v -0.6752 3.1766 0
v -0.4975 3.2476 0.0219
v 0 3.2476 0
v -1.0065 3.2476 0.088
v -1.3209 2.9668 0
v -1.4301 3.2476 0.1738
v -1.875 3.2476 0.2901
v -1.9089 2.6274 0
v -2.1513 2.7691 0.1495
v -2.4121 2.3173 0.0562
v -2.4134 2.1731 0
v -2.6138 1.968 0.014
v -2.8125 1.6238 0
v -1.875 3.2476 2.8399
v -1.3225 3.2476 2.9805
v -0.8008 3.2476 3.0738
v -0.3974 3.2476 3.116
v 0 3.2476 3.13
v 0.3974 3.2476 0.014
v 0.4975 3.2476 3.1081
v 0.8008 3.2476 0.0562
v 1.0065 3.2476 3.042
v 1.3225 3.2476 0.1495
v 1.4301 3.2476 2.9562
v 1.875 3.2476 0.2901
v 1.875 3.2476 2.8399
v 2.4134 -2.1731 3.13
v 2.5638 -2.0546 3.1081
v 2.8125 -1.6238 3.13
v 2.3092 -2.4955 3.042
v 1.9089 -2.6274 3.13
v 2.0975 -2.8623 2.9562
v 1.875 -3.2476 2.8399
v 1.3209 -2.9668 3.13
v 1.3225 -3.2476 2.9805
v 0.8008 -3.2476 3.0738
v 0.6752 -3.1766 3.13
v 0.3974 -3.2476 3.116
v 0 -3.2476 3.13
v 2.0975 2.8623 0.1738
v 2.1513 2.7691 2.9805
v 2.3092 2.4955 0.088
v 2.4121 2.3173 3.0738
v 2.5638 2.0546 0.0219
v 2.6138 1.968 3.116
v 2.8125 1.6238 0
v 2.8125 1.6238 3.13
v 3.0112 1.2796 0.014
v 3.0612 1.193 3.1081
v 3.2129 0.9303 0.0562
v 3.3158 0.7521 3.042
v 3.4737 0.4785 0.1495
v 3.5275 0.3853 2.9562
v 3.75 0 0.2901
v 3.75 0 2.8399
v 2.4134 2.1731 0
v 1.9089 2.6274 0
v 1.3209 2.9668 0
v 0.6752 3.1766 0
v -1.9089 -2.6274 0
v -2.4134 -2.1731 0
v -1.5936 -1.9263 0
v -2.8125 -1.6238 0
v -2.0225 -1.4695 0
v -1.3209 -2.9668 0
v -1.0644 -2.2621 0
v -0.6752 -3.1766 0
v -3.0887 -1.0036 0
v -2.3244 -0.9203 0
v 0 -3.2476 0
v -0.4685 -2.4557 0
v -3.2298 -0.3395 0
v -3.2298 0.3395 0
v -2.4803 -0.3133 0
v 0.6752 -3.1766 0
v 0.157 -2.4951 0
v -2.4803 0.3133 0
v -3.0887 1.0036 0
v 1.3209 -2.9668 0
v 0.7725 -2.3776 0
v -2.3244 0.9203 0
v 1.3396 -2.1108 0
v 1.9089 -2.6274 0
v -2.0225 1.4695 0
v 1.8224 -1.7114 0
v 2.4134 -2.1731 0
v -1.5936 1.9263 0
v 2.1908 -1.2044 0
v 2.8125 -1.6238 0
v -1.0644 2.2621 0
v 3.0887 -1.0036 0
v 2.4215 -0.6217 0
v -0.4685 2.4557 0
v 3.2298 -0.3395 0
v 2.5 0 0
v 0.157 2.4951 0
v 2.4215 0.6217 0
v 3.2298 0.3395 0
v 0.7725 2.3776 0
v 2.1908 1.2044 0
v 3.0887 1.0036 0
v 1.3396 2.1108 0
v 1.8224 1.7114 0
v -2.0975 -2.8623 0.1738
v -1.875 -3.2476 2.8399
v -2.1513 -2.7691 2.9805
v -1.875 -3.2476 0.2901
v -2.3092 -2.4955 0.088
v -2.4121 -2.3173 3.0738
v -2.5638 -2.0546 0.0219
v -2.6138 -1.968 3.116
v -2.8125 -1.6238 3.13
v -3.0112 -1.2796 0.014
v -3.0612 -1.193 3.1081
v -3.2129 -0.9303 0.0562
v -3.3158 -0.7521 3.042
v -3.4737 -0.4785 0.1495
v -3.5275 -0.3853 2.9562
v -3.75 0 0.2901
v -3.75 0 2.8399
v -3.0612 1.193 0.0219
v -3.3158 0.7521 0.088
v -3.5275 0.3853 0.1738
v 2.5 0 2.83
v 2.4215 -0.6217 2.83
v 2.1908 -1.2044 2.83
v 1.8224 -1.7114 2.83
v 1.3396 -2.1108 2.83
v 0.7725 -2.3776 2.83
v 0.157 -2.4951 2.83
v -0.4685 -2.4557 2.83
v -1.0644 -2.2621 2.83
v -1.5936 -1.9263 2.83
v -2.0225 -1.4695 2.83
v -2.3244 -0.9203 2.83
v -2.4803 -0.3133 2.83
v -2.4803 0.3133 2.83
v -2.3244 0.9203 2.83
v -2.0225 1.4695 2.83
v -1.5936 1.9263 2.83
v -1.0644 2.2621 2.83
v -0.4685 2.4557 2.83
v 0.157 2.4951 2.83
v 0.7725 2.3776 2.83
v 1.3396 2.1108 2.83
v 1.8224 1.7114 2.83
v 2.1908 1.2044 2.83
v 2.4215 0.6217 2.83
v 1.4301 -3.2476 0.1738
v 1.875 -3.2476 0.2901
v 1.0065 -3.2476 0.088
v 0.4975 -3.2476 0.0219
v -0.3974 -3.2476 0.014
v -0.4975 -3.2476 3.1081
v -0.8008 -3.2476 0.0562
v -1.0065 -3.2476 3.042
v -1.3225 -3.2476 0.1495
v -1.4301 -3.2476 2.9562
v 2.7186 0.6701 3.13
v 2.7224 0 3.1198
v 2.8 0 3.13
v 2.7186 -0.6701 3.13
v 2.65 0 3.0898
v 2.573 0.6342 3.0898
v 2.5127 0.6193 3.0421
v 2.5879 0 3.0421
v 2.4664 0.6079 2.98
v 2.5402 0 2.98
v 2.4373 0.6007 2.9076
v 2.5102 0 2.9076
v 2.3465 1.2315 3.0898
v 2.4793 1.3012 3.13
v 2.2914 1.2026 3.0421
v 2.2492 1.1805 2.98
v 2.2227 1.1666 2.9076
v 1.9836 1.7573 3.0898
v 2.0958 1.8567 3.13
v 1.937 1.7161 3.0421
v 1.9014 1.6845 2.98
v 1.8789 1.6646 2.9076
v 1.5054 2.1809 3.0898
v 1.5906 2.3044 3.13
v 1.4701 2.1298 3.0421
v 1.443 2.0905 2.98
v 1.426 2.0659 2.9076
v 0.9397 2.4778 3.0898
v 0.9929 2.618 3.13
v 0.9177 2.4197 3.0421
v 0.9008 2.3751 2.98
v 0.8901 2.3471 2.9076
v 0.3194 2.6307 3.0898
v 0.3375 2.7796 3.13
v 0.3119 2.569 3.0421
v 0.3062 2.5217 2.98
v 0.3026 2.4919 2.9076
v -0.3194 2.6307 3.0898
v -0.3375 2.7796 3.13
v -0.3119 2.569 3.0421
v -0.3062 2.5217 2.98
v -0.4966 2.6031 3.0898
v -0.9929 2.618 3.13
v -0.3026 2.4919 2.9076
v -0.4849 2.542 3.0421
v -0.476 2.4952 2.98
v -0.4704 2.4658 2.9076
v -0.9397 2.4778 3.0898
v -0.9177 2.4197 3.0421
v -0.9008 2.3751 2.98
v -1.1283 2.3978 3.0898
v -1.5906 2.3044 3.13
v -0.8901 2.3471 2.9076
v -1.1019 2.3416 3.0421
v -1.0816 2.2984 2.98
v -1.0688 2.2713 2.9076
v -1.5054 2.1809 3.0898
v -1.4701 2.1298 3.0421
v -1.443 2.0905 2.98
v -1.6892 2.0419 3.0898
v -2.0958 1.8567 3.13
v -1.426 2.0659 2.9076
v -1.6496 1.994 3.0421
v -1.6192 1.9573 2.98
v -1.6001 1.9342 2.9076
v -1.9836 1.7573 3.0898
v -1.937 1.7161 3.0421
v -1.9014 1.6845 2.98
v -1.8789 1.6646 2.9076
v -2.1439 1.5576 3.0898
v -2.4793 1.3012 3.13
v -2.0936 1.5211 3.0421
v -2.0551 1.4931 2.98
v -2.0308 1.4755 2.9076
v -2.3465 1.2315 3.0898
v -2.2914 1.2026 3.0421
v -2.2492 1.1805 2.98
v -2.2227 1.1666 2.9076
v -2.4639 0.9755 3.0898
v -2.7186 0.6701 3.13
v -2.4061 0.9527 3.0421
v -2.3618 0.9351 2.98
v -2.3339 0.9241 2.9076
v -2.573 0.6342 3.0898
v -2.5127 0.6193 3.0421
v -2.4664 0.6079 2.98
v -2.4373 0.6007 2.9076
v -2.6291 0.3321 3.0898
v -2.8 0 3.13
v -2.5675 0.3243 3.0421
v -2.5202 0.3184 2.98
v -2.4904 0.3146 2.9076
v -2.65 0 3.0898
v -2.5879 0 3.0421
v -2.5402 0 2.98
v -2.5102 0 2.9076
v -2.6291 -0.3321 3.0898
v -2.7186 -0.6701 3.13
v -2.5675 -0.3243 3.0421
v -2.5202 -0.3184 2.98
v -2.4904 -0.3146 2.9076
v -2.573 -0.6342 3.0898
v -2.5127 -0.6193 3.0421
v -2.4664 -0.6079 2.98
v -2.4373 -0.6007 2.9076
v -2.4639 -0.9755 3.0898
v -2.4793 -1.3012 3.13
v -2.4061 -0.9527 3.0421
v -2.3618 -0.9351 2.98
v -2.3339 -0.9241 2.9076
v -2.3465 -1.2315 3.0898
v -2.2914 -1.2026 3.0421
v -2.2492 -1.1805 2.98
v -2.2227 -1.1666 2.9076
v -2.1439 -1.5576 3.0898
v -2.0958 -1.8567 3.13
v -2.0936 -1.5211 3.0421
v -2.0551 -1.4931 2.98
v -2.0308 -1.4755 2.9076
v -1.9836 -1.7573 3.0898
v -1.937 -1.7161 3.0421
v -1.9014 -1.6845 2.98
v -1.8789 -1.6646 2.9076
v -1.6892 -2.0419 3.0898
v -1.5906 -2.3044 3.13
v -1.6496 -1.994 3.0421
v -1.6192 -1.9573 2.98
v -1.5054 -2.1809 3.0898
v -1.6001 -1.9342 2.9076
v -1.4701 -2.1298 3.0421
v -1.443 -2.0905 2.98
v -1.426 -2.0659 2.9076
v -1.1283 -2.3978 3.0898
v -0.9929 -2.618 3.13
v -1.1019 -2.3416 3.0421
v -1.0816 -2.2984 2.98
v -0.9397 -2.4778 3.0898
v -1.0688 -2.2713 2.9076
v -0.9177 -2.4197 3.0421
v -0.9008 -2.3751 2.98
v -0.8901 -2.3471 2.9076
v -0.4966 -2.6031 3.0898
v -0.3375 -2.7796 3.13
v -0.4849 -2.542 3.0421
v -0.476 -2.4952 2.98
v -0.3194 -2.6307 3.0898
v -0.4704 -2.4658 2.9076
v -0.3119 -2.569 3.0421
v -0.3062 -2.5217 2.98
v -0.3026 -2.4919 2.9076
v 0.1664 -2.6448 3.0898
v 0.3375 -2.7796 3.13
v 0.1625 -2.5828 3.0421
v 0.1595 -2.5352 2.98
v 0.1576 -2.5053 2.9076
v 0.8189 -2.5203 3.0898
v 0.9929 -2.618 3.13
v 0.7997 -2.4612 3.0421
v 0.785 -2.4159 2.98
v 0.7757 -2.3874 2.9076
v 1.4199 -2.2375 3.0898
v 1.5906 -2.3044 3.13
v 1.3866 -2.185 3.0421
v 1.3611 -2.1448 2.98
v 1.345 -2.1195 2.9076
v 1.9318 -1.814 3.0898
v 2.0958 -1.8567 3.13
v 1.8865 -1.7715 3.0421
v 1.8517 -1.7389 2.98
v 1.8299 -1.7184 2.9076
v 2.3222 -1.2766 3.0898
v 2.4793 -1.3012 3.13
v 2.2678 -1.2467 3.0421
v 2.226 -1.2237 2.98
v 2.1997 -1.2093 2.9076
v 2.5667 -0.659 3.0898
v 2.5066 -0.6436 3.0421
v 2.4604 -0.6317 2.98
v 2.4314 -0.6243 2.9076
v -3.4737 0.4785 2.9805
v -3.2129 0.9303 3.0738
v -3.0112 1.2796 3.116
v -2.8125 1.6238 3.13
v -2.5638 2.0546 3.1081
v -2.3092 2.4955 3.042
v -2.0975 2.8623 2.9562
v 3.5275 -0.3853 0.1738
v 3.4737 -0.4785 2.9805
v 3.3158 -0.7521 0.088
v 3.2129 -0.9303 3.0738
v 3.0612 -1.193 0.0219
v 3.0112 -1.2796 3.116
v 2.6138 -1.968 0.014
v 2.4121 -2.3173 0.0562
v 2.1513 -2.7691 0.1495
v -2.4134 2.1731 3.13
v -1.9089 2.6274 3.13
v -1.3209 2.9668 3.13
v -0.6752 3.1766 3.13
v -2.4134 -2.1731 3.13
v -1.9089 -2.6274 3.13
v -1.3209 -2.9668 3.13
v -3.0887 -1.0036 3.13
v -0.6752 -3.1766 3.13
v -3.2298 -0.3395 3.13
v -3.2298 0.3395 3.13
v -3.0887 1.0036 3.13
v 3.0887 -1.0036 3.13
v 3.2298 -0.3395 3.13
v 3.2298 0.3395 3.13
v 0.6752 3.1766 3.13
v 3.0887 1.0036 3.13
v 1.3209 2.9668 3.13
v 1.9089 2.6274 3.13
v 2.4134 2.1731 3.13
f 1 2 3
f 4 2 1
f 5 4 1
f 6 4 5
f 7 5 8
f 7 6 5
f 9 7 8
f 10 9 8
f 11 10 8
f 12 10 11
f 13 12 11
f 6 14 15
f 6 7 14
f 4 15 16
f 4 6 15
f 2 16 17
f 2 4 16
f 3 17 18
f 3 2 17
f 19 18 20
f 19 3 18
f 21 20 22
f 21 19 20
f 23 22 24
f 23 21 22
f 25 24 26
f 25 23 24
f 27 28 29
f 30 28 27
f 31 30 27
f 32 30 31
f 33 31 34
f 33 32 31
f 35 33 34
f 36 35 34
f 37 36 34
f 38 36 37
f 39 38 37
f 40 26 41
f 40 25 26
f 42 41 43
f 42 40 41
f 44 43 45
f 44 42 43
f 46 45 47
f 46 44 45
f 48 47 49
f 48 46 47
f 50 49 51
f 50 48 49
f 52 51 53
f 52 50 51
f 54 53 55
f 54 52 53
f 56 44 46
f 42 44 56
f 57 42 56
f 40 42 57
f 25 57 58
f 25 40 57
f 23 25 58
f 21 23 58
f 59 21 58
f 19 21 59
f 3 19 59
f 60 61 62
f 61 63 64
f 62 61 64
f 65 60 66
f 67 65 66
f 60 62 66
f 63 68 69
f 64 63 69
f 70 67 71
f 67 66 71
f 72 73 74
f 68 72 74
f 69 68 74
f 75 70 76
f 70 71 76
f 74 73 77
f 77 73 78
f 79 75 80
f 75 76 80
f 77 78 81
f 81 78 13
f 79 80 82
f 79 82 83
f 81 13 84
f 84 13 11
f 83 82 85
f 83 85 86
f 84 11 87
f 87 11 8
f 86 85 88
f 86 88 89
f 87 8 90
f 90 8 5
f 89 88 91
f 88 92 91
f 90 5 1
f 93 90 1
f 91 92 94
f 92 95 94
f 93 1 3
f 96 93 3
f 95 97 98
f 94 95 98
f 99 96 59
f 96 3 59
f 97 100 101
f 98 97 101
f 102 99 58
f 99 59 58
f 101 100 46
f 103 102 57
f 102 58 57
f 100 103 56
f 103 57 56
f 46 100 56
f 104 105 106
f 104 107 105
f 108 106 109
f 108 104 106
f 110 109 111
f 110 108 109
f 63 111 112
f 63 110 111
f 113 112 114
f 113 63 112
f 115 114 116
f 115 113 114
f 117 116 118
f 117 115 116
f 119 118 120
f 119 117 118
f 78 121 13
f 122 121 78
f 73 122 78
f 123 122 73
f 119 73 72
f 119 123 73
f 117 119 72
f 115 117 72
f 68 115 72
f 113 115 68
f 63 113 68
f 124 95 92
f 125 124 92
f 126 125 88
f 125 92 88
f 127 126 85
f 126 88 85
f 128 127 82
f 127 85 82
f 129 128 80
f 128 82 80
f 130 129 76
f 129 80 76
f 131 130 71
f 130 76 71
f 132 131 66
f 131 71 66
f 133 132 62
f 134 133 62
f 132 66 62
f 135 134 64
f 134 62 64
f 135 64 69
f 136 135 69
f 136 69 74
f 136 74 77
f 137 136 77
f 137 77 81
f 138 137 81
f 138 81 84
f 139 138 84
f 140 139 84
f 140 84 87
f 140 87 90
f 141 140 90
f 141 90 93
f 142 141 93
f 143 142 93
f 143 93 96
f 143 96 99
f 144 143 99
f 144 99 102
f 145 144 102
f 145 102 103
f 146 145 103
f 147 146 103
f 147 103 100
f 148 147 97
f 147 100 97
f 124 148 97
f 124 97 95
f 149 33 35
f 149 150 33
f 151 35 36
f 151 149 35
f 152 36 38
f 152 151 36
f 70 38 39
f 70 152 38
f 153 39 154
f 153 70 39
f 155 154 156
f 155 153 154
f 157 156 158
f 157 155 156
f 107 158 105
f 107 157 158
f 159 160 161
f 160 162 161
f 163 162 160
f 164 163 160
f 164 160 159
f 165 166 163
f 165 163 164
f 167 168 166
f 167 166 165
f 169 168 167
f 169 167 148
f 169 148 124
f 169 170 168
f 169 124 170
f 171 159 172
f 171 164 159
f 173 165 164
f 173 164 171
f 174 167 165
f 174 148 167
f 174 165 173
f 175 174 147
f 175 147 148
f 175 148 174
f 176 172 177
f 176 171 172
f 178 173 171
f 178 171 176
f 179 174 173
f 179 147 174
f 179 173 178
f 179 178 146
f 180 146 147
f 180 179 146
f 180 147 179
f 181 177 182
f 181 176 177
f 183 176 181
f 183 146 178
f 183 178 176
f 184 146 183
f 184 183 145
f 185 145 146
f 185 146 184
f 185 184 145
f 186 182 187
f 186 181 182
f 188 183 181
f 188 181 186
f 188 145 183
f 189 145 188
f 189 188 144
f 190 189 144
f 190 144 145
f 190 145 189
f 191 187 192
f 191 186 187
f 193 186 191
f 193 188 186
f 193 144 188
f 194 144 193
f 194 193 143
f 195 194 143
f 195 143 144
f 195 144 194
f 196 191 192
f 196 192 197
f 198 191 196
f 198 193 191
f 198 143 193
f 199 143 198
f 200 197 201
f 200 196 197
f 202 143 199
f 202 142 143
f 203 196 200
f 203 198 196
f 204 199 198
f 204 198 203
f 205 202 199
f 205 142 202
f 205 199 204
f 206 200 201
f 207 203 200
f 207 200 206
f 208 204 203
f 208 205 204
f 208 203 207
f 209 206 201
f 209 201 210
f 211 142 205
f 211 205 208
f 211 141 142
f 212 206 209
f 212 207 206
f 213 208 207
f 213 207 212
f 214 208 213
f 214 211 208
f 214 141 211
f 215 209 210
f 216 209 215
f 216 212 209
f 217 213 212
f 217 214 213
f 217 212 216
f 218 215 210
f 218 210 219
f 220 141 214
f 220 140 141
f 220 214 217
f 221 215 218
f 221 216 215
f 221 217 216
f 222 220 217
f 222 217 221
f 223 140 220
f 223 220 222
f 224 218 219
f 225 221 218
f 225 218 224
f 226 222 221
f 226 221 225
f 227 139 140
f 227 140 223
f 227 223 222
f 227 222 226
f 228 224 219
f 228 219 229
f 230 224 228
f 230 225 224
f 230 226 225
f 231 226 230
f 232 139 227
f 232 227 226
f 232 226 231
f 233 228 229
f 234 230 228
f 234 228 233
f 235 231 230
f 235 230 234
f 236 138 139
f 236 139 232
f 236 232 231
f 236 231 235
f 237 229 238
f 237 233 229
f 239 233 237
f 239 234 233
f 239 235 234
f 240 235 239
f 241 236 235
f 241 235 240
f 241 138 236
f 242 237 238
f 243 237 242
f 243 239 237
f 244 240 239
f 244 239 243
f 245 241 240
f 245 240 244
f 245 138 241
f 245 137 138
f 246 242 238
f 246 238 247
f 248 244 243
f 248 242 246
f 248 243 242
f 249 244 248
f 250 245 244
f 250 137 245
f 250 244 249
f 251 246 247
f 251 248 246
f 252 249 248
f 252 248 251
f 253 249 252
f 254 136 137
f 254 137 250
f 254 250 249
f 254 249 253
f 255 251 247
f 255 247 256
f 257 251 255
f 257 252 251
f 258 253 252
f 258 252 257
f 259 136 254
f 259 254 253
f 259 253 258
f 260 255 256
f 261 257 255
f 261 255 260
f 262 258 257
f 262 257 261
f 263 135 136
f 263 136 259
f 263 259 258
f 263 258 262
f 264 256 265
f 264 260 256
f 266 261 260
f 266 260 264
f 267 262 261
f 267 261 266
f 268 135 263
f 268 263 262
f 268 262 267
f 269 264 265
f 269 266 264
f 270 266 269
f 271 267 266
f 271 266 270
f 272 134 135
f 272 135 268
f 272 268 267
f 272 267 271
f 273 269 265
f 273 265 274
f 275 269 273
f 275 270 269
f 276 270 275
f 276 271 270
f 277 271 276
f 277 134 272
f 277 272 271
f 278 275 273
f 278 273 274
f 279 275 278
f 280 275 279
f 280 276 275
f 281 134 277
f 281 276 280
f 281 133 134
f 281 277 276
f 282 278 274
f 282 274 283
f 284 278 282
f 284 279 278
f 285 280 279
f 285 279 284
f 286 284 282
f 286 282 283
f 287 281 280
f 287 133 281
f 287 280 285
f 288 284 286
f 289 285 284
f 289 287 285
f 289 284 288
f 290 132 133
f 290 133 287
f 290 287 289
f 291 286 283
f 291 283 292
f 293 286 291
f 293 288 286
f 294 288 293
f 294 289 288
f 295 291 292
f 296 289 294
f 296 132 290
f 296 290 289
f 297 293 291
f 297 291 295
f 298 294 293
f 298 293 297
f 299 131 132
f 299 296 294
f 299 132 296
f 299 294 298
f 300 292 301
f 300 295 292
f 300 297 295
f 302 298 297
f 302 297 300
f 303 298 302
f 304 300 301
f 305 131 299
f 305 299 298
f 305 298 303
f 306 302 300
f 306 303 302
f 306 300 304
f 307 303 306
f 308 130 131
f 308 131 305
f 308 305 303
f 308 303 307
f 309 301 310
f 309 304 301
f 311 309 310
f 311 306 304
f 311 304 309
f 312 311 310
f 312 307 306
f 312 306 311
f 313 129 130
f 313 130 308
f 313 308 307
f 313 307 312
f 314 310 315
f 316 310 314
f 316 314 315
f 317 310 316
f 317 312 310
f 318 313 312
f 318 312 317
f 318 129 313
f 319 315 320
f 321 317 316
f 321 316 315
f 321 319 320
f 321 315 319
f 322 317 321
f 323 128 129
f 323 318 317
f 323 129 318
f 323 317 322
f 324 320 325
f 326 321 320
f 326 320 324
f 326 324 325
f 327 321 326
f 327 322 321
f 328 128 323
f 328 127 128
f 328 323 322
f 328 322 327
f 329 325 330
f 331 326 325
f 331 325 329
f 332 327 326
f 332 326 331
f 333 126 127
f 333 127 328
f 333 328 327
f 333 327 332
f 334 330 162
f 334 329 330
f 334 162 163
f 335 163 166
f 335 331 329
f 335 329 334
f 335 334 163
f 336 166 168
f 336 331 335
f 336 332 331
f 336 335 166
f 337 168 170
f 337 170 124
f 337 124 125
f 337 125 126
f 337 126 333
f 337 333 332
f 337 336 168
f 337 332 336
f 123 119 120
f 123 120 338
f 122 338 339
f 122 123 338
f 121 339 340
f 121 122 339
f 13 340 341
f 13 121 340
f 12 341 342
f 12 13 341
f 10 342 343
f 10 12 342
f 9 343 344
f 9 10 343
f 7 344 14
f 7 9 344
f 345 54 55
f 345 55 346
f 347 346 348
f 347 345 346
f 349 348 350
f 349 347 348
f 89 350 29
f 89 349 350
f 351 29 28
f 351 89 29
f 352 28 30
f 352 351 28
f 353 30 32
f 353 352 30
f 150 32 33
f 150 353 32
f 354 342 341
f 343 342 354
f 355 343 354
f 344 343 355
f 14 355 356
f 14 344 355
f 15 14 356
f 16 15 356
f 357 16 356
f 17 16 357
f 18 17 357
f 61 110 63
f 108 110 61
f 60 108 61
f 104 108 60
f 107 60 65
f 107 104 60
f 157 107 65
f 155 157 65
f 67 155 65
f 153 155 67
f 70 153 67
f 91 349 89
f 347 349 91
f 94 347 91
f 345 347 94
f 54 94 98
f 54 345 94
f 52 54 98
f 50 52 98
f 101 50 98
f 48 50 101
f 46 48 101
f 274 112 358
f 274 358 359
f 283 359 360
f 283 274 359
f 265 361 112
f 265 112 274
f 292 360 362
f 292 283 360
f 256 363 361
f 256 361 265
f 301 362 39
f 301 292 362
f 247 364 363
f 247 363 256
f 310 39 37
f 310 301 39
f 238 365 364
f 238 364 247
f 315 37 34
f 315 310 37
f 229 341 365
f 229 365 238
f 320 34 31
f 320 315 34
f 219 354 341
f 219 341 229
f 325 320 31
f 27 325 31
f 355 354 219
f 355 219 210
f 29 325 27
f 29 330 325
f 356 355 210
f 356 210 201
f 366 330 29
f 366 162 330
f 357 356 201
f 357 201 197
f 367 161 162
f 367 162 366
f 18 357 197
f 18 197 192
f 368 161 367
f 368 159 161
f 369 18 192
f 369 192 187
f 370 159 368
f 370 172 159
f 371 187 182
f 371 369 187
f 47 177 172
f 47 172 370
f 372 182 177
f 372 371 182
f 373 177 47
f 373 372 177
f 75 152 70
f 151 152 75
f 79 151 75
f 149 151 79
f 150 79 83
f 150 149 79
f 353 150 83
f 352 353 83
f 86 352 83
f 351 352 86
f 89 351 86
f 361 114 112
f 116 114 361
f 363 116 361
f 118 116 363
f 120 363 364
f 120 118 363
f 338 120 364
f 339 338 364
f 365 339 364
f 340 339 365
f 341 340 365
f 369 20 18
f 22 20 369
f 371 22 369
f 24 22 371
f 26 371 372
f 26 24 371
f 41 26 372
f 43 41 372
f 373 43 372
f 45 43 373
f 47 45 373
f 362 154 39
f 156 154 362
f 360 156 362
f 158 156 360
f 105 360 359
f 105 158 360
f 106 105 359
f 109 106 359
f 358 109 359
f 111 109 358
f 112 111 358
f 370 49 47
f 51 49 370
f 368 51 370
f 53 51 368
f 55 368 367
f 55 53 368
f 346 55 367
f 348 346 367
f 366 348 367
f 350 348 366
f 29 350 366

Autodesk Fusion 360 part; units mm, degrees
sketch "Sketch1" plane through (0, 0, 0) normal (0, 0, 1) x (1, 0, 0) in component "Component"
  line L0 (1.875, 3.2476) -> (3.75, 0)
  line L1 (-1.875, 3.2476) -> (1.875, 3.2476)
  line L2 (-3.75, 0) -> (-1.875, 3.2476)
  line L3 (-1.875, -3.2476) -> (-3.75, 0)
  line L4 (1.875, -3.2476) -> (-1.875, -3.2476)
  line L5 (3.75, 0) -> (1.875, -3.2476)
extrude "Extrude1" add sketch "Sketch1" along normal blind 3.13 in component "Component"
sketch "Sketch2" plane through (0, 0, 0) normal (0, 0, 1) x (1, 0, 0) in component "Component"
  circle A0 centre (0, 0) radius 2.5
extrude "Extrude2" cut sketch "Sketch2" along normal through all in component "Component"
fillet "Fillet1" radius 0.3 1 edges at (-2.3308, 0.904, 3.13) in component "Component"
sketch "Sketch3" plane through (0, 0, 0) normal (0, 1, 0) x (1, 0, 0) in component "Component"
  line L0 (3.2476, 0) -> (3.75, 0)
  line L1 (3.75, 0) -> (3.75, -0.2901)
  line L2 (3.75, -0.2901) -> (3.2476, 0)
  line L3 (3.2476, -3.13) -> (3.75, -3.13)
  line L4 (3.75, -3.13) -> (3.75, -2.8399)
  line L5 (3.75, -2.8399) -> (3.2476, -3.13)
revolve "Revolve1" cut sketch "Sketch3" angle 360 about axis through (0, 0, 1.75) along (0, 0, 1) contours L3 L4 L5 in component "Component"
revolve "Revolve2" cut sketch "Sketch3" angle 360 about axis through (0, 0, 1.75) along (0, 0, 1) contours L0 L1 L2 in component "Component"
thread "Thread1" in component "Component"
component "Component" placed x (1, 0, 0) y (0, 1, 0) z (0, 0, 1) at (0, 0, 0)
